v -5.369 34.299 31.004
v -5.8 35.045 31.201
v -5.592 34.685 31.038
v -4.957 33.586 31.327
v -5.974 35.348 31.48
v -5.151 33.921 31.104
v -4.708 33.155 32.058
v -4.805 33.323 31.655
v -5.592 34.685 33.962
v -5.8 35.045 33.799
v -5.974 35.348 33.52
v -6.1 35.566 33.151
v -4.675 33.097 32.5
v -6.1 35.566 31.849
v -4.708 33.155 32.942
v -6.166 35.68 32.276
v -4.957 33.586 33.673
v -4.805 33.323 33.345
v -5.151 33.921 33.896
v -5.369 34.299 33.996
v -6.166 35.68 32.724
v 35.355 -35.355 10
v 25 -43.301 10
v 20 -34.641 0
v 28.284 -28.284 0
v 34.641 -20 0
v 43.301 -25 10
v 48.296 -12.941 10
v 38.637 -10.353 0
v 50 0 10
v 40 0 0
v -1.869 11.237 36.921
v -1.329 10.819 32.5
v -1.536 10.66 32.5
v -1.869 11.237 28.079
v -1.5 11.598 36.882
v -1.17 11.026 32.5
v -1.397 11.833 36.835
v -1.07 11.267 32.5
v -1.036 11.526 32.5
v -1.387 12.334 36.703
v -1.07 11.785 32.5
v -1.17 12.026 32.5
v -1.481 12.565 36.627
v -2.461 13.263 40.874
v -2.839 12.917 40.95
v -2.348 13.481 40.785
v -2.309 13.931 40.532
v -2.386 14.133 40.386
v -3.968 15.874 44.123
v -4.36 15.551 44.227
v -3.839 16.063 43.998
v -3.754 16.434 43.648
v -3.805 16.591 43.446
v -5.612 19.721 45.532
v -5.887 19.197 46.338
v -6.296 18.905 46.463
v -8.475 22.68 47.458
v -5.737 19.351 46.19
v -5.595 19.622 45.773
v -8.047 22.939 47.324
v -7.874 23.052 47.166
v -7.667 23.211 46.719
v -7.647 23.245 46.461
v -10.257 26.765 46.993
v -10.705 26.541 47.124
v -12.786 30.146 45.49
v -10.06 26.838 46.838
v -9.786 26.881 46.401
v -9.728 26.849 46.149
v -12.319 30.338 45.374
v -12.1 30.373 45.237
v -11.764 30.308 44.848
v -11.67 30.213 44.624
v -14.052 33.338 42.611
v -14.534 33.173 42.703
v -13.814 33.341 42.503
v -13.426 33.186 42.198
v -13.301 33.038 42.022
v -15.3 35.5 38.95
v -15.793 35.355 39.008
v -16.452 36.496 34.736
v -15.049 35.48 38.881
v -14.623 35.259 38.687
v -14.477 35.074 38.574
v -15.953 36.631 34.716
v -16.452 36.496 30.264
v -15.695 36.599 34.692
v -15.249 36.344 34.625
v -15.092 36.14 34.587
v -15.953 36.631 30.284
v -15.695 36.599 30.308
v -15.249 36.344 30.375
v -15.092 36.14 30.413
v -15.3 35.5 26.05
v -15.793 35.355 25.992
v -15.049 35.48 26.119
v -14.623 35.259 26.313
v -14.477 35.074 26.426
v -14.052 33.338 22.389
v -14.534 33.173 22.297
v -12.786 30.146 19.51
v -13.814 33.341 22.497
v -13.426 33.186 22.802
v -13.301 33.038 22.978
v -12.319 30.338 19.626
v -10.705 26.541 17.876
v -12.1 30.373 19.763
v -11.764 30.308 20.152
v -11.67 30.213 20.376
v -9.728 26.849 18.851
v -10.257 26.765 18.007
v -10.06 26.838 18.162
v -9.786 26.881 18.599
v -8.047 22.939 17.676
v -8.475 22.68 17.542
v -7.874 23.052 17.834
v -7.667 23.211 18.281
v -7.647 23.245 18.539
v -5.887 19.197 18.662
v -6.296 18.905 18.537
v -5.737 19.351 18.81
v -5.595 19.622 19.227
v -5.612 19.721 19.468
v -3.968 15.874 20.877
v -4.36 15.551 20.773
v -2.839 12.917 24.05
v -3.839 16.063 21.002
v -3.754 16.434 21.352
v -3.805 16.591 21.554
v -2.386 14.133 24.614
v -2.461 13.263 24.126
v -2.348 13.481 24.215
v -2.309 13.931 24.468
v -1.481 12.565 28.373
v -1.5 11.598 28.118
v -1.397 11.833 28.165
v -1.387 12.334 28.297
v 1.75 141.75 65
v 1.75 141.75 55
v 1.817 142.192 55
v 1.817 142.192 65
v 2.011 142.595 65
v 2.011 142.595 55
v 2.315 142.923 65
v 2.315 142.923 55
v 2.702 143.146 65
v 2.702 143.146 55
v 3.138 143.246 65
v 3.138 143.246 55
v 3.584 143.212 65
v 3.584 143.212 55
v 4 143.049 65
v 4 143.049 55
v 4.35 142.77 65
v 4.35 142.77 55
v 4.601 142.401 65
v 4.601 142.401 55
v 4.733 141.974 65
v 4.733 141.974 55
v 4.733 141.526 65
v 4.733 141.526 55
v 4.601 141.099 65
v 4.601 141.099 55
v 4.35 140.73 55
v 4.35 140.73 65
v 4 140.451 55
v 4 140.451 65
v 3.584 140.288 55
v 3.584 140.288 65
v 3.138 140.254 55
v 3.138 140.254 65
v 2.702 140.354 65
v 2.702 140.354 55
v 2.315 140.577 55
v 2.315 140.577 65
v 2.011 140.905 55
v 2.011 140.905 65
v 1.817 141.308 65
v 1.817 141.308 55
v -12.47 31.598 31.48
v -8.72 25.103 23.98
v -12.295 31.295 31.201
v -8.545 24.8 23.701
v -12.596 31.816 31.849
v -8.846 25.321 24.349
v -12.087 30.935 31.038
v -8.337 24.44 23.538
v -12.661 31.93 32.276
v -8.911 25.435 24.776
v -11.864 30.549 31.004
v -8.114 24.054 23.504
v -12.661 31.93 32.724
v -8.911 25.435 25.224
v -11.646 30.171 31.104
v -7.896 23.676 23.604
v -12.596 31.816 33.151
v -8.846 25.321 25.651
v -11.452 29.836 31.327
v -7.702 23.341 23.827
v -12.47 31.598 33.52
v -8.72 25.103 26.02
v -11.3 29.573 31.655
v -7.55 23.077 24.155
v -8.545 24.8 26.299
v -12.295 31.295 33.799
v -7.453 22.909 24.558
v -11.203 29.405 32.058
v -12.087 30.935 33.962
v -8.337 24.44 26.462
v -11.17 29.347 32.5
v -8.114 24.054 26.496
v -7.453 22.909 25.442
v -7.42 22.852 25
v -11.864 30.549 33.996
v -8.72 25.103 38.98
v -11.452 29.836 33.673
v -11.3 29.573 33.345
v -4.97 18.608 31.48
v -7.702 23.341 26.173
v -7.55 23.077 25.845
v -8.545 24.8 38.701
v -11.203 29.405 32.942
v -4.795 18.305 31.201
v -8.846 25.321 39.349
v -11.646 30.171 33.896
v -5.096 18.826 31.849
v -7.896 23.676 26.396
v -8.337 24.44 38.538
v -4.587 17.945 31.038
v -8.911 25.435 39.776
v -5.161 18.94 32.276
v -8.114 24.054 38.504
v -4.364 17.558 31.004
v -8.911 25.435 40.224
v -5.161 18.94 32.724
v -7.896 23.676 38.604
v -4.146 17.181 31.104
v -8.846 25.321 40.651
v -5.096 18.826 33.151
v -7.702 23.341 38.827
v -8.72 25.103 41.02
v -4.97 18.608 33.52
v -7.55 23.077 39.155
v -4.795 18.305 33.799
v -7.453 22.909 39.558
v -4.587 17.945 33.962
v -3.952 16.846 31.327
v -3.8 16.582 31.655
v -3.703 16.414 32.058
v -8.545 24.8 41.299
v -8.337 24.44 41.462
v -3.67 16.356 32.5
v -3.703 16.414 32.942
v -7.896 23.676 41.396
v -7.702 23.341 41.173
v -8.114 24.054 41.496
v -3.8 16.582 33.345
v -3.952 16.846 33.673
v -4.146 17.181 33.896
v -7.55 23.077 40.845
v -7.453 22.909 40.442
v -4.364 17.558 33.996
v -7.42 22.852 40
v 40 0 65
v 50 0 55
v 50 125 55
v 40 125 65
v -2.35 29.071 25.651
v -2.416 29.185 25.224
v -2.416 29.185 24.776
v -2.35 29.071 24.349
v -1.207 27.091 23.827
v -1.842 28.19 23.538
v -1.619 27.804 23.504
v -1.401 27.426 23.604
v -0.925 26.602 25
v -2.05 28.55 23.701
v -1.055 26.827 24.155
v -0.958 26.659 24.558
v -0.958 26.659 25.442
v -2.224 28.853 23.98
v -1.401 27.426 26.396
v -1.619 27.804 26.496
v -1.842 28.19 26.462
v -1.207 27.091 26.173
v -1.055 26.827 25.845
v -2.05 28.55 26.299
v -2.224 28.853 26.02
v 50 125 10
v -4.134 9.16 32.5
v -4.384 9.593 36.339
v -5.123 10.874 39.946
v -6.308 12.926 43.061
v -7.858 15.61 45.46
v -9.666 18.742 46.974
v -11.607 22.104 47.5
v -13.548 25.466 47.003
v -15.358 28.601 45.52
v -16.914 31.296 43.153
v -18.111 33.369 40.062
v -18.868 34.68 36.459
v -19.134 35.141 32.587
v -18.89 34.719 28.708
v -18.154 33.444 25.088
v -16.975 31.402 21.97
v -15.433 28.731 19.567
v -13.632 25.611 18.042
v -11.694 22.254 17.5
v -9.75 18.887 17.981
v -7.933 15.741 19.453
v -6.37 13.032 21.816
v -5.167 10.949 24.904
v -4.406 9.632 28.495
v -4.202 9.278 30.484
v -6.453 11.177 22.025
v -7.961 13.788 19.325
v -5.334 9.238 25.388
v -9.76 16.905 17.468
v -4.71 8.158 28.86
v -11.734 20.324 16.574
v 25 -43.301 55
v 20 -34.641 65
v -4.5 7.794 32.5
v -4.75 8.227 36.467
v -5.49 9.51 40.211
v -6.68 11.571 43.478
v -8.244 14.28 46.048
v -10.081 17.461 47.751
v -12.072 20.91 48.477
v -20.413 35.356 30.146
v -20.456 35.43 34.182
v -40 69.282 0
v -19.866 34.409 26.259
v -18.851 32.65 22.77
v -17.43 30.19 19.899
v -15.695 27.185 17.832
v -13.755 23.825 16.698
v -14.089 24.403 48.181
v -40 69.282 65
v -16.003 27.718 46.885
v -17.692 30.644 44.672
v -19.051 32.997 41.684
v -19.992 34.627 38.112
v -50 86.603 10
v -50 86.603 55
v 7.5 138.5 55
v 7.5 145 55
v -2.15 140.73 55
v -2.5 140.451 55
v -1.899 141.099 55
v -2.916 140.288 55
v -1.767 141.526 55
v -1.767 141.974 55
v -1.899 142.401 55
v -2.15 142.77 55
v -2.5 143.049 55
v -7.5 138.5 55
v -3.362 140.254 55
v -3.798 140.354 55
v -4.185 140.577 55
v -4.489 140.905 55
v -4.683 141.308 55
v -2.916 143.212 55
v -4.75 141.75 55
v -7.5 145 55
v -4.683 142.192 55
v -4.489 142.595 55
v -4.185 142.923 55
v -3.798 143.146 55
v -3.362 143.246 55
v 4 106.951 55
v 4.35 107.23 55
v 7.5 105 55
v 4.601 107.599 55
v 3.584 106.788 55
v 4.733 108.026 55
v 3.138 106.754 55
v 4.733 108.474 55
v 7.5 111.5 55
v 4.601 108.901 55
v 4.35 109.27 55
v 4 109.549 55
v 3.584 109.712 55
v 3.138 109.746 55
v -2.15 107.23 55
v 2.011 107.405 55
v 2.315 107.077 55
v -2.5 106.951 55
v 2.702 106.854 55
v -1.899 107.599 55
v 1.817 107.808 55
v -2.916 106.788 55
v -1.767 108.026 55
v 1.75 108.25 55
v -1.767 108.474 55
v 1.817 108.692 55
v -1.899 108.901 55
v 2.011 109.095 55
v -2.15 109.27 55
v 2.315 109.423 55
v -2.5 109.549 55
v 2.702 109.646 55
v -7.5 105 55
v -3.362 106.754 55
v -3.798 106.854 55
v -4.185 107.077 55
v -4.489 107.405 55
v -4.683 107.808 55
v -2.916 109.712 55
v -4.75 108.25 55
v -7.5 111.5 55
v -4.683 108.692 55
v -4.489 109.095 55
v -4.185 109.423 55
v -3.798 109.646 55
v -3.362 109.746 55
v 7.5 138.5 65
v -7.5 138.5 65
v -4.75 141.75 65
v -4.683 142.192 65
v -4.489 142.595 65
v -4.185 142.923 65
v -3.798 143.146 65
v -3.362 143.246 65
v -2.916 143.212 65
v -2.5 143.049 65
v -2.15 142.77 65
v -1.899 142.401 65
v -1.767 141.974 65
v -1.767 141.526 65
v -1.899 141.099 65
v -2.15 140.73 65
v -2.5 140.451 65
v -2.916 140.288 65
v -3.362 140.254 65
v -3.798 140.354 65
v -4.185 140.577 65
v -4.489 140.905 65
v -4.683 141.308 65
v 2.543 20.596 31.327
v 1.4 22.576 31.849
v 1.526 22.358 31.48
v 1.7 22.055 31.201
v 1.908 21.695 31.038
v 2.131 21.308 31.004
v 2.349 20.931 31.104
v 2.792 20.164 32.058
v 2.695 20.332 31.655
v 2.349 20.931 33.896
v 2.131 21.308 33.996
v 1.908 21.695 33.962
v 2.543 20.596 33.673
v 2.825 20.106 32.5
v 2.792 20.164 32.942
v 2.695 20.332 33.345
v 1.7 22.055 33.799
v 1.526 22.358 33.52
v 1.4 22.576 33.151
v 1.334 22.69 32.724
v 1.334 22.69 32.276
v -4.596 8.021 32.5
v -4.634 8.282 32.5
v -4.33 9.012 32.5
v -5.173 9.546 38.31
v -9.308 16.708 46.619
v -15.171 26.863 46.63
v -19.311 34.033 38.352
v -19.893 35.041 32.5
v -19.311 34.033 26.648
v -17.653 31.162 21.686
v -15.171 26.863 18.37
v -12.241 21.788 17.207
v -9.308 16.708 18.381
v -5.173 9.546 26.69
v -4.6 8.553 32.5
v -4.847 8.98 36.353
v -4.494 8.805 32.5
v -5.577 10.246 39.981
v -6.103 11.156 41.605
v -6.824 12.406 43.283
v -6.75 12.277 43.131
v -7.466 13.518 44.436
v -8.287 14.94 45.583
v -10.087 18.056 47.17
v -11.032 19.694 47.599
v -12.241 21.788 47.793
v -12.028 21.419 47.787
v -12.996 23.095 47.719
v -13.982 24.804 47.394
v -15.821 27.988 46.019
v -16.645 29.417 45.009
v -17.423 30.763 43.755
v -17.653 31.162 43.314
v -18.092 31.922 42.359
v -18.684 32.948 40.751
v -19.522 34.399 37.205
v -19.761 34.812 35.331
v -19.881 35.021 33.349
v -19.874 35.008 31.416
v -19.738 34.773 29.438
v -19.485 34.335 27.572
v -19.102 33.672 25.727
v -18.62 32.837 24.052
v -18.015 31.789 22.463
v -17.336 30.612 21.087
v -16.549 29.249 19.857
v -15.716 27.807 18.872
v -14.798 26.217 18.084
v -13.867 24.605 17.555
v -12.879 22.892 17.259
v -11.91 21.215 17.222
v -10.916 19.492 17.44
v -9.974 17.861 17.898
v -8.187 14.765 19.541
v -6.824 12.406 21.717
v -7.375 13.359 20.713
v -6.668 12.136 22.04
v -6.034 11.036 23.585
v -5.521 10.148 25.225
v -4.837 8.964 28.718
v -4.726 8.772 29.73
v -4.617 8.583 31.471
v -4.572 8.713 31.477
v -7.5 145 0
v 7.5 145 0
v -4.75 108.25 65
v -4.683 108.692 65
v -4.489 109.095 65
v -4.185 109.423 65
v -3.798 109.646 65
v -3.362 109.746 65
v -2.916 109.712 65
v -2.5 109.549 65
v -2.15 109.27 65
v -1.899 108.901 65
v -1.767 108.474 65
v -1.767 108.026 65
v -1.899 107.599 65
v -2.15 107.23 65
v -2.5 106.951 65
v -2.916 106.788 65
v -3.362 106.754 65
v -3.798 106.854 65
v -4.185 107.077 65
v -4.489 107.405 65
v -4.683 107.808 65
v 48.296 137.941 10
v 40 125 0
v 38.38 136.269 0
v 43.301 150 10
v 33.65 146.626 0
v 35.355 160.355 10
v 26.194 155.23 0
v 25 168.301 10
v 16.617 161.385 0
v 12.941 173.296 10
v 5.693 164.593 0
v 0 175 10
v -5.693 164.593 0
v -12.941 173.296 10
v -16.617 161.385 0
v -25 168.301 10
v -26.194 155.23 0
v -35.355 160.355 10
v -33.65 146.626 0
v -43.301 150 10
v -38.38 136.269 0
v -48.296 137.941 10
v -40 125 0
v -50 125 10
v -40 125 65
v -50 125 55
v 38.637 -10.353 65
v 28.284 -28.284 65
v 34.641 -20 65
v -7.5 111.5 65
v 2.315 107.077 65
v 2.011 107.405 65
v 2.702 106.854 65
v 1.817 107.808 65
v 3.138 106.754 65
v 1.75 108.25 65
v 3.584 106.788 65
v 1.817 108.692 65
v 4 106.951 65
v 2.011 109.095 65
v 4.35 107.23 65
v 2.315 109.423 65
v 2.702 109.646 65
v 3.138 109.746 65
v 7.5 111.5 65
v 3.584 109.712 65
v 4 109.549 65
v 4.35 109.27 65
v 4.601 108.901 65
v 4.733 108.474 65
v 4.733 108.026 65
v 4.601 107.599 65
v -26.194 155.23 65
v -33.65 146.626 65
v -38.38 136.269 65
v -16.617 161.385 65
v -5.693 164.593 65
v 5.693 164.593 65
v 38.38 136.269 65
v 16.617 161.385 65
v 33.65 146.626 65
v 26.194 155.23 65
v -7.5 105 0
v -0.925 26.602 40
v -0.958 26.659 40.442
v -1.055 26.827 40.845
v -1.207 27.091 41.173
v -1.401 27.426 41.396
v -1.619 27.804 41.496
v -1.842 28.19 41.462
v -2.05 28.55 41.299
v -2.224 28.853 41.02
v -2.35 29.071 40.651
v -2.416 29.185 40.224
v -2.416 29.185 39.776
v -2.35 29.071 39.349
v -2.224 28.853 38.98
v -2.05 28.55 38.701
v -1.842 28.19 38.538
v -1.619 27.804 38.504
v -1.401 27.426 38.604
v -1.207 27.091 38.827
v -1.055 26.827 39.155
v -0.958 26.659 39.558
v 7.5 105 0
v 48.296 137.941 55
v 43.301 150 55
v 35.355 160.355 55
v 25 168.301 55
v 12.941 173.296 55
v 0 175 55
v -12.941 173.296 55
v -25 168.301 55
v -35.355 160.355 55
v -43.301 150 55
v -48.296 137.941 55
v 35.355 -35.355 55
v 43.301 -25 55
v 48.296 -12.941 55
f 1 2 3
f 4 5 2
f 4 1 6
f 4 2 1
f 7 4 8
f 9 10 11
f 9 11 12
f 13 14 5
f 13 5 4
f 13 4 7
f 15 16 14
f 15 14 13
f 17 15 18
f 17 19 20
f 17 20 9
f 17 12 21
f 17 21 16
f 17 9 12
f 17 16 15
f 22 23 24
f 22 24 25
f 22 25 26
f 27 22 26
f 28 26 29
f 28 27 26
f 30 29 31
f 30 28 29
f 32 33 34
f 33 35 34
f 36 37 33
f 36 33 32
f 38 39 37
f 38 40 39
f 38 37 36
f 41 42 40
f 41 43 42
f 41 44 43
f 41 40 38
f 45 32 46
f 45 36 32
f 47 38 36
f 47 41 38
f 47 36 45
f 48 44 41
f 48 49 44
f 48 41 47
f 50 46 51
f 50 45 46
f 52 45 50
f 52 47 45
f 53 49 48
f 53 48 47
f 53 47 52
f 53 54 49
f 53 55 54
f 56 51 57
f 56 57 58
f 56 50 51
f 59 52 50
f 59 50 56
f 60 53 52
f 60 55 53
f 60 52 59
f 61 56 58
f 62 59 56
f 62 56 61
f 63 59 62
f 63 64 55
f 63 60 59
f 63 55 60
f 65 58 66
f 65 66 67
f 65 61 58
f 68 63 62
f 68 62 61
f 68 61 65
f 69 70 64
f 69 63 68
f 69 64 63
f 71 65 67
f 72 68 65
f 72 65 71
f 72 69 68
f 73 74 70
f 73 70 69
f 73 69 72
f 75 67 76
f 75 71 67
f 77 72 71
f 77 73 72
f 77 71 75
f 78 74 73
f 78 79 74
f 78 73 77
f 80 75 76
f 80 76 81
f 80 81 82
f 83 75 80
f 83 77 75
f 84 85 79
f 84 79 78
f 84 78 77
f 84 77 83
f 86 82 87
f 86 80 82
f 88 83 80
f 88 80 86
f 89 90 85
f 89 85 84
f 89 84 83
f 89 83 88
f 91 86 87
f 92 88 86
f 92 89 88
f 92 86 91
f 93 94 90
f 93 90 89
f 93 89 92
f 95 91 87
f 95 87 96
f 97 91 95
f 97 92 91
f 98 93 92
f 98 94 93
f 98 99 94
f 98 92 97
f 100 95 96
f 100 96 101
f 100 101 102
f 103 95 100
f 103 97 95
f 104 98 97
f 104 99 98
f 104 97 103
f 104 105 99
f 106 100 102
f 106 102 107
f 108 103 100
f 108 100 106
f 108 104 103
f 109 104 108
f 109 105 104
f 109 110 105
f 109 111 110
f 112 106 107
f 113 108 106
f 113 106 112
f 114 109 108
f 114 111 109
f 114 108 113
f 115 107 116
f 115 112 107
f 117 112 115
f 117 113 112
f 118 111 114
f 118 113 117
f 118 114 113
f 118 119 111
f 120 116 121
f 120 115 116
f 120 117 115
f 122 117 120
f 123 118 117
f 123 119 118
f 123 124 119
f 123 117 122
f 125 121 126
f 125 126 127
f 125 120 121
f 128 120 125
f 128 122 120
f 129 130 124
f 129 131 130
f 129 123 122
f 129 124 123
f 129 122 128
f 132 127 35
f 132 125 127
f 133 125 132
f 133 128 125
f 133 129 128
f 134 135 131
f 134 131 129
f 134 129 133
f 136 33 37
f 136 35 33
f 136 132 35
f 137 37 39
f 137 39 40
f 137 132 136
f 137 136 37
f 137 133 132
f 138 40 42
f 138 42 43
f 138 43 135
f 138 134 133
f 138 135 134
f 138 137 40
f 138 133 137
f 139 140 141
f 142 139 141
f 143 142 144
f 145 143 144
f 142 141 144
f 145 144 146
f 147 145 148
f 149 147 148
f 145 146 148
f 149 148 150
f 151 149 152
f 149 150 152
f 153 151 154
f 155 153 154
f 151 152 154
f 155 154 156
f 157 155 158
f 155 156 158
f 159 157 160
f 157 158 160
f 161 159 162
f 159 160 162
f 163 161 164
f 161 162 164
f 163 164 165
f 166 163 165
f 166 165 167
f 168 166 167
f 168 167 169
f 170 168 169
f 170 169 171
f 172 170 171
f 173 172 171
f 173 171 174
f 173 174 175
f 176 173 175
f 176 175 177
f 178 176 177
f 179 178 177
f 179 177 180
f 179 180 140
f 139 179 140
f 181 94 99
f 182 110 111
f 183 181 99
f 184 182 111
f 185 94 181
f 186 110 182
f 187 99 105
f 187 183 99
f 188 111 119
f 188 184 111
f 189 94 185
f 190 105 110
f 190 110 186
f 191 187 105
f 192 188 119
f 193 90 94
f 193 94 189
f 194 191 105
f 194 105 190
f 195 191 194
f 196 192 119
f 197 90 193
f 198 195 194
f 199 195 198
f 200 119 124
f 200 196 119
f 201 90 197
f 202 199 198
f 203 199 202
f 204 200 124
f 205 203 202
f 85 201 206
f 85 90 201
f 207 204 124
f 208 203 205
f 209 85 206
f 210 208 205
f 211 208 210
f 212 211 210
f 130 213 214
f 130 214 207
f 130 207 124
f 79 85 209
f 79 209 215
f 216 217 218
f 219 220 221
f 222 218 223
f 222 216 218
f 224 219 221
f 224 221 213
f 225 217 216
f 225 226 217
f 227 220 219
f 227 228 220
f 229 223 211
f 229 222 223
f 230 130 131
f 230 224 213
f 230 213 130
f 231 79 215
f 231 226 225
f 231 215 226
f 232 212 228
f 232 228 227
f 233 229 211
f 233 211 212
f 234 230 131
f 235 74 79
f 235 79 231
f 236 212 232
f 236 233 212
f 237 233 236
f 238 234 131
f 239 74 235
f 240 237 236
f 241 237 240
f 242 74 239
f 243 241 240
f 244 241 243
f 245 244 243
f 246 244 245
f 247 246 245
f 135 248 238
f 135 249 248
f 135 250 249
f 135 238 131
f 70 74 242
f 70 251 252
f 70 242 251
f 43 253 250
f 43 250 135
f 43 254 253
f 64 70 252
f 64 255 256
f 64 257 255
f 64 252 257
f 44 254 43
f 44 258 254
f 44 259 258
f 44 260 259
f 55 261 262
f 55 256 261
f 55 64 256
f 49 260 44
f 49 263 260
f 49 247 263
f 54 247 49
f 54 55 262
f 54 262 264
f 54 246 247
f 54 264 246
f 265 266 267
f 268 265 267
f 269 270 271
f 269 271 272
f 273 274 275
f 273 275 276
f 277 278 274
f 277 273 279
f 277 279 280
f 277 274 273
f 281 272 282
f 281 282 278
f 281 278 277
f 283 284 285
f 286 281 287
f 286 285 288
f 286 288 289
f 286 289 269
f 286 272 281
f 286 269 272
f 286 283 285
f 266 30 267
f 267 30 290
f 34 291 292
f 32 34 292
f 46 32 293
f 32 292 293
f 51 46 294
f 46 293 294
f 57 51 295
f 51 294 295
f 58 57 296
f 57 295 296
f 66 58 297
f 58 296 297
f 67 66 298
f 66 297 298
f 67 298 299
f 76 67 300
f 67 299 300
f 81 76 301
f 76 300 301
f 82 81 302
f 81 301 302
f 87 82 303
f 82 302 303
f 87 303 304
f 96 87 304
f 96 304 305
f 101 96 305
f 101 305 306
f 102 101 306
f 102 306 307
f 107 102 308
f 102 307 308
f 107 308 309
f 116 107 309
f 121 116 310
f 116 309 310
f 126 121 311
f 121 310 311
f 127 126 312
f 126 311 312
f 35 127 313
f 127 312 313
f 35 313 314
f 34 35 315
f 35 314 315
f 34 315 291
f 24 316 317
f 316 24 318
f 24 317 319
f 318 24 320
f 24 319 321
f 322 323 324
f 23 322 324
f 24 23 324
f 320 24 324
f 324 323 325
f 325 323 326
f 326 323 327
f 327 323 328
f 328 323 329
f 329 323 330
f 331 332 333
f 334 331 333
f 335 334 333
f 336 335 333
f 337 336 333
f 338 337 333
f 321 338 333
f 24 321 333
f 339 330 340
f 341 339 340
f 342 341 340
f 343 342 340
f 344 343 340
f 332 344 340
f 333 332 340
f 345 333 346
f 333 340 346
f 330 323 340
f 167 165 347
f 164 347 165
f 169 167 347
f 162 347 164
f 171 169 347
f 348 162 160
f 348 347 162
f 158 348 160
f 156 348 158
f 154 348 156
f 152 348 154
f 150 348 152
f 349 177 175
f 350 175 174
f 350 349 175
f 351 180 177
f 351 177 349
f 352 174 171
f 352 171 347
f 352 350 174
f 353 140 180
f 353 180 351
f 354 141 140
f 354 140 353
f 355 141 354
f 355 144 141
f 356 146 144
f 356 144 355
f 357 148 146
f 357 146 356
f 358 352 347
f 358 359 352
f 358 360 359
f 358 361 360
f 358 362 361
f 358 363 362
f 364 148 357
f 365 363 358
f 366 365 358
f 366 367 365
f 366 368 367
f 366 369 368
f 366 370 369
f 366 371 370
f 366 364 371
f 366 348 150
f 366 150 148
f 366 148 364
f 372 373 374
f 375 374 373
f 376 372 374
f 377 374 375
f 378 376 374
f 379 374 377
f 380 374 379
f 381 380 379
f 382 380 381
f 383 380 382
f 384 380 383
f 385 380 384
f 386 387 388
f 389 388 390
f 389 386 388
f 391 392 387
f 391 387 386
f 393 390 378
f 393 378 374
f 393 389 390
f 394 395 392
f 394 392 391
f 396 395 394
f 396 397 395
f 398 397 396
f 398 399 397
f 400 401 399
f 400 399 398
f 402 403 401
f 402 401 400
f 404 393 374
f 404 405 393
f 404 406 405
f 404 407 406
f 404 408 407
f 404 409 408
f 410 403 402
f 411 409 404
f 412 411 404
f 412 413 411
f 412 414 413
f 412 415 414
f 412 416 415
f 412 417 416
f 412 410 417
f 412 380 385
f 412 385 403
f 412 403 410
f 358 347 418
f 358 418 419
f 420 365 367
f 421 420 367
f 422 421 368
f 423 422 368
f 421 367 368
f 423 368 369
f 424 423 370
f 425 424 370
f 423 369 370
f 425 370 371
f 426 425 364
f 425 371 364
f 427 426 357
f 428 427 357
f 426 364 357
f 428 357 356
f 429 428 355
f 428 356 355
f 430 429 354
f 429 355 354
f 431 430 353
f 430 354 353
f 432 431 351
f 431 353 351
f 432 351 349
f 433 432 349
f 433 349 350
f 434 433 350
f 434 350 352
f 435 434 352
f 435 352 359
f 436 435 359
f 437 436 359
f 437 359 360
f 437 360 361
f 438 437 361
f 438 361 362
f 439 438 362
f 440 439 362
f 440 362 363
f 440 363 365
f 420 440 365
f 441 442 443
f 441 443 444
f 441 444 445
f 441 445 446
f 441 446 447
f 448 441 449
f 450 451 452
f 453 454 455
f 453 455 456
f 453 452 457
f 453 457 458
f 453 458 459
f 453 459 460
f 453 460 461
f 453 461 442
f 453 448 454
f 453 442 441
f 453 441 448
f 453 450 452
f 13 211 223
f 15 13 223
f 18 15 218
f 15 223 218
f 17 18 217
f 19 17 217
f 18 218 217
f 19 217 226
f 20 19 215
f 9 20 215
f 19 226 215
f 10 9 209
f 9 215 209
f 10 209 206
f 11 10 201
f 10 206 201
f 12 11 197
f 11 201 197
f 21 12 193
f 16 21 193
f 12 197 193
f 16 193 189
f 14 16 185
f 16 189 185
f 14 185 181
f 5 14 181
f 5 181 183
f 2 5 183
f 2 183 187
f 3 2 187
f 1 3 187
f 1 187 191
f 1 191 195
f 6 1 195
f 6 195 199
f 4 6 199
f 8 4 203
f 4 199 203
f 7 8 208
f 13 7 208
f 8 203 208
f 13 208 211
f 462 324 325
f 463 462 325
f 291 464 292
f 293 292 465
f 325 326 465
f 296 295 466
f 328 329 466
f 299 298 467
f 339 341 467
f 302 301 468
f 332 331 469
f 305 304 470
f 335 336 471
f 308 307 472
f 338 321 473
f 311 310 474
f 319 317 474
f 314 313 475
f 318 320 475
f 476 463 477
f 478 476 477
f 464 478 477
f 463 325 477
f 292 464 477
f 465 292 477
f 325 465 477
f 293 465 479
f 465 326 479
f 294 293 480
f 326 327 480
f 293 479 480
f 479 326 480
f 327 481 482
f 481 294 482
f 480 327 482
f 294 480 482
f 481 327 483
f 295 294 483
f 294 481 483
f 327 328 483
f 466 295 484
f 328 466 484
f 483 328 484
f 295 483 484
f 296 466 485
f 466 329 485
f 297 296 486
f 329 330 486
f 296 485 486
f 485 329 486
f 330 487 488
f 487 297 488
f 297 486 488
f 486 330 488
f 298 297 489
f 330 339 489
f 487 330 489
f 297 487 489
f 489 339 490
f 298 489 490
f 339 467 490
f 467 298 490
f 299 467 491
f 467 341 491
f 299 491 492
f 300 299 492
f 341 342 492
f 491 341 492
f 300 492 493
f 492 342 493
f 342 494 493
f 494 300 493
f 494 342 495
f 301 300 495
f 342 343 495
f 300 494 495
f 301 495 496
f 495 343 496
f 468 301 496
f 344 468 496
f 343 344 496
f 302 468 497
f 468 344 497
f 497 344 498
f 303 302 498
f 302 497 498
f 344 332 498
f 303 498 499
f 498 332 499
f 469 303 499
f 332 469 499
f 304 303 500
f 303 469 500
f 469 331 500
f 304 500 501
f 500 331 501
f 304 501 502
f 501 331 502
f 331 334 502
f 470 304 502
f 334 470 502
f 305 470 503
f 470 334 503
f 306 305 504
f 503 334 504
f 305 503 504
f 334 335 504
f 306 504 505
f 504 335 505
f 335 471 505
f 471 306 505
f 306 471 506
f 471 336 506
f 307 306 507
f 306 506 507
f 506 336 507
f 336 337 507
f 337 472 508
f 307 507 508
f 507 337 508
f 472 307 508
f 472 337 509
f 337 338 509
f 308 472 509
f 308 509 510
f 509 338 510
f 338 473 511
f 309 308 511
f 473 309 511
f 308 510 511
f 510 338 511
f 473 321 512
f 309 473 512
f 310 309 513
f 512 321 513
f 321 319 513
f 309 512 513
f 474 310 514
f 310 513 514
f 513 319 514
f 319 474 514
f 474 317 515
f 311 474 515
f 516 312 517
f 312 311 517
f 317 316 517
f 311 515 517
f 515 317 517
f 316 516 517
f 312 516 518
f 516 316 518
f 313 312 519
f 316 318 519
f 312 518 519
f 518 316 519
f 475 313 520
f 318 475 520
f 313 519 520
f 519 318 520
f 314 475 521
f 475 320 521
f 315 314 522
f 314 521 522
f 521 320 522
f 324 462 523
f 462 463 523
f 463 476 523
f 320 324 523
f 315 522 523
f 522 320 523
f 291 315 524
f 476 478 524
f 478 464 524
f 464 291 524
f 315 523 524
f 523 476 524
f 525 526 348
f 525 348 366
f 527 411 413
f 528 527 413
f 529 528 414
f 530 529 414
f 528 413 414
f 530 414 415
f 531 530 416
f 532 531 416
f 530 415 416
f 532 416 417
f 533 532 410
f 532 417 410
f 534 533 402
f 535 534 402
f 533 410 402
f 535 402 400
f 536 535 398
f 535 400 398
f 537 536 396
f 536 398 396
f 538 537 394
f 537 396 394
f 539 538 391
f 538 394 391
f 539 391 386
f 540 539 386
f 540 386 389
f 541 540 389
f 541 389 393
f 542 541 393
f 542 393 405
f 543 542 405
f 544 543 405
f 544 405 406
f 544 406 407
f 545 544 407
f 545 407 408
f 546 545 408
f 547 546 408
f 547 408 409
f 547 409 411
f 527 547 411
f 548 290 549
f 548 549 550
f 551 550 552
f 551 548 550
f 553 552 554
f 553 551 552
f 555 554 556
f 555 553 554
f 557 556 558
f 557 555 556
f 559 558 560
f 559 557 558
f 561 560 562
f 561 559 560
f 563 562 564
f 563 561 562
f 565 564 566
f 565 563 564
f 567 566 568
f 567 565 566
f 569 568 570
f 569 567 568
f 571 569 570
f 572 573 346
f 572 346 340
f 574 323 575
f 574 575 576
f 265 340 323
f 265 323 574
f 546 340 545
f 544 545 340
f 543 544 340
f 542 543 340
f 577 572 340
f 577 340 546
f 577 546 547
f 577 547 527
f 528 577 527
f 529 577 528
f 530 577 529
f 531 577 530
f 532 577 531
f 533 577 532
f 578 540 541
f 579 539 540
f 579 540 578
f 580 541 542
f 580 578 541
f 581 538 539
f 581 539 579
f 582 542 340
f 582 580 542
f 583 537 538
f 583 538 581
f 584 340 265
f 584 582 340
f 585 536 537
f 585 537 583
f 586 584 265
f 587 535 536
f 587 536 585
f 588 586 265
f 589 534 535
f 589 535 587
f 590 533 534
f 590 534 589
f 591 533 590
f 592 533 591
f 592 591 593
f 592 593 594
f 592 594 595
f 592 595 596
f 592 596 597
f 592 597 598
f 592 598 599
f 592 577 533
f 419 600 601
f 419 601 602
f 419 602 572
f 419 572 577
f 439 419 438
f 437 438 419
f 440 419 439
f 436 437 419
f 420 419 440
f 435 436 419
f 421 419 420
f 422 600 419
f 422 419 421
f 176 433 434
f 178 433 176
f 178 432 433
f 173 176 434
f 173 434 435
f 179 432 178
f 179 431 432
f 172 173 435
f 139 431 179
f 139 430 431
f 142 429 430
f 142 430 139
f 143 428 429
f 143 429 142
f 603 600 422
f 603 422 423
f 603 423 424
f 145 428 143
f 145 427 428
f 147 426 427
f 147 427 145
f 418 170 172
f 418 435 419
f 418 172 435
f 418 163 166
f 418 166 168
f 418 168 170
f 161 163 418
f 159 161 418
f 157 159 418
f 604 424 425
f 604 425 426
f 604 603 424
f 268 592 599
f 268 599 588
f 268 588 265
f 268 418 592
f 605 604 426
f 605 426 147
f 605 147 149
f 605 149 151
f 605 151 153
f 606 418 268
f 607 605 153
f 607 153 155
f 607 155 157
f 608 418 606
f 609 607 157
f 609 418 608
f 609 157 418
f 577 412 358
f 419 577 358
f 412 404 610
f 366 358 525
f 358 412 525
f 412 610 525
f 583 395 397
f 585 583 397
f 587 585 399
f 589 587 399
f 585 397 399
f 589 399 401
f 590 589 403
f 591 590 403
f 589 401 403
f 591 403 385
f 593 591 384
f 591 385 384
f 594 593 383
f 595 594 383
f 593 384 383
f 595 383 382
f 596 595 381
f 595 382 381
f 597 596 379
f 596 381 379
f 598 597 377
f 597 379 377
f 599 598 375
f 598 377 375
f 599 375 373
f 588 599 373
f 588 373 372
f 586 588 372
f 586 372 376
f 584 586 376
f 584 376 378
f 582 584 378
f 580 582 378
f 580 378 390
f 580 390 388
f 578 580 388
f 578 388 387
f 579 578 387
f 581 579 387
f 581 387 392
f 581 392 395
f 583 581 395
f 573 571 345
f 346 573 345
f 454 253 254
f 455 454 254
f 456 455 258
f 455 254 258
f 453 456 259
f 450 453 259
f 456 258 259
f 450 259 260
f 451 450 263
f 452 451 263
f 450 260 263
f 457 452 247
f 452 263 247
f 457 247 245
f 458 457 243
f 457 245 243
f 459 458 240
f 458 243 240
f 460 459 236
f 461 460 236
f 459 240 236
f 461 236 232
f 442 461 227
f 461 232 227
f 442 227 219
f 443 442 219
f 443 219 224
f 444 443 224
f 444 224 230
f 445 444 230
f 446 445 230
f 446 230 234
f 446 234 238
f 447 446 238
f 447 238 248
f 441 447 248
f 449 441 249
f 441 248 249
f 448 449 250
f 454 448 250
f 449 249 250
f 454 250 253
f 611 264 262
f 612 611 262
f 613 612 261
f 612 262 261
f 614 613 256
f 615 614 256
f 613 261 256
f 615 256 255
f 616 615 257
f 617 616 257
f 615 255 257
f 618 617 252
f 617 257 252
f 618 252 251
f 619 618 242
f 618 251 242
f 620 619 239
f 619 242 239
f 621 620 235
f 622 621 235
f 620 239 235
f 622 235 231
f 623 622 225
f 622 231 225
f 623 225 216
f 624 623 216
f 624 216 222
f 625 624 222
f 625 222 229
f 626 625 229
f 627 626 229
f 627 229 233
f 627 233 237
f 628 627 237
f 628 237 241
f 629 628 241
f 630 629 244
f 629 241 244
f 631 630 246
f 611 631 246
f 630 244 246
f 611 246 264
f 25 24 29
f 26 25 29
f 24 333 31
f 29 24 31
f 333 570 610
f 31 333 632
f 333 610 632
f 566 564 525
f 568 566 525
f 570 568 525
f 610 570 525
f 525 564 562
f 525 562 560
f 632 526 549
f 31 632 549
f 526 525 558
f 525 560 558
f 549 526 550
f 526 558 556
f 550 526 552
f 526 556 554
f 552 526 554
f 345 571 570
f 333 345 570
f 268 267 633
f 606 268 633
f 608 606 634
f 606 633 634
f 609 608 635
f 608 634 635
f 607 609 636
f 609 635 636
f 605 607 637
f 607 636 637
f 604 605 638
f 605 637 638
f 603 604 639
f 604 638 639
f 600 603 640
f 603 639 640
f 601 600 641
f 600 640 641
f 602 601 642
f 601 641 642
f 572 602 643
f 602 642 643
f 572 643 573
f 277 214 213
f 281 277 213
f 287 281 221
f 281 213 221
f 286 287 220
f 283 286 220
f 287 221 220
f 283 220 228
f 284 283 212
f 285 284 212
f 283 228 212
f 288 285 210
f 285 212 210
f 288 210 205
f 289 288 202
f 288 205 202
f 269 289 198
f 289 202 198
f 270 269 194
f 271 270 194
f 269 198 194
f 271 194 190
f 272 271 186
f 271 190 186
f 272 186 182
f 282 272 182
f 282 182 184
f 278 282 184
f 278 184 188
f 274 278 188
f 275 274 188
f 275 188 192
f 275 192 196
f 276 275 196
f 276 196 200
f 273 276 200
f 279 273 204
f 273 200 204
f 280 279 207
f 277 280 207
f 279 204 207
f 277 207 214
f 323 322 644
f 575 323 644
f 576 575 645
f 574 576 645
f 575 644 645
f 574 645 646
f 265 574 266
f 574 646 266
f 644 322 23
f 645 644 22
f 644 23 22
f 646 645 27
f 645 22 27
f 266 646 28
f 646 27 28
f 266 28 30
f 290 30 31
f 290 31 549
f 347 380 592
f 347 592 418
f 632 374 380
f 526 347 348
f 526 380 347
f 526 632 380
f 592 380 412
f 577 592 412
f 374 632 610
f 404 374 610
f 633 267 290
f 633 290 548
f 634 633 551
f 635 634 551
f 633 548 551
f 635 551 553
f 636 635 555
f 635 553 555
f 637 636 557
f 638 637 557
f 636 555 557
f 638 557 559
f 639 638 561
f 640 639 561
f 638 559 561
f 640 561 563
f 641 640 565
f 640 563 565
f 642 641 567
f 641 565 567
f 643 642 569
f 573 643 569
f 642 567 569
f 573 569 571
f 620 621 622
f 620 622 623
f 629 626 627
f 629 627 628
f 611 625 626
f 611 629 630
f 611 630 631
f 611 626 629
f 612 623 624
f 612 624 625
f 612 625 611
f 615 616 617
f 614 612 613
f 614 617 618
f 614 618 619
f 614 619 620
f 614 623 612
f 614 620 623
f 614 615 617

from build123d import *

# Parameters (mm, degrees)
BOSS_EXTRUDE1_DEPTH = 65
CUT_EXTRUDE1_DEPTH  = 194.261480901
SKETCH5_R           = 15
CUT_EXTRUDE4_DEPTH  = 5
SKETCH6_R           = 1.5
CUT_EXTRUDE5_DEPTH  = 7.5
CHAMFER1_SIZE       = 10
SKETCH8_W           = 15
SKETCH8_H           = 40
CUT_EXTRUDE6_DEPTH  = 55
SKETCH9_W           = 15
SKETCH9_H           = 27
SKETCH9_R           = 1.5
CUT_EXTRUDE7_DEPTH  = 191.131533418
FILLET1_R           = 1


with BuildPart() as part:
    # Sketch1 → Boss-Extrude1 (new body)
    with BuildSketch(Plane.XY):
        with BuildLine():
            Line((-50, 125), (-50, 0))
            ThreePointArc((-50, 0), (0, -50), (50, 0))
            Line((50, 0), (50, 125))
            ThreePointArc((50, 125), (0, 175), (-50, 125))
        make_face()
    extrude(amount=BOSS_EXTRUDE1_DEPTH)

    # Sketch2 → Cut-Extrude1 (cut, through all)
    with BuildSketch(Plane.XY.offset(65)):
        Polygon((260.825571734, -451.763142156), (25, -43.301270189), (-50, 86.602540378), (-50, 0), (-50, -471.651143468), (10.233499812, -1413.028395178), (321.059071546, -1393.140393866), align=None)
    extrude(amount=-CUT_EXTRUDE1_DEPTH, mode=Mode.SUBTRACT)

    # Sketch5 → Cut-Extrude4 (cut)
    with BuildSketch(Plane(origin=(0, 0, 0), x_dir=(0, 0, 1), z_dir=(-0.866025403784438, -0.5000000000000012, 0))):
        with Locations(Location((32.5, 25, 0), (0, 0, 270))):
            Circle(SKETCH5_R)
    extrude(amount=-CUT_EXTRUDE4_DEPTH, mode=Mode.SUBTRACT)

    # Sketch6 → Cut-Extrude5 (cut)
    with BuildSketch(Plane(origin=(4.330127019, 2.5, 0), x_dir=(0, 0, 1), z_dir=(-0.8660254037844378, -0.5000000000000012, 0))):
        with Locations(Location((40, 25, 0), (0, 0, 270))):
            Circle(SKETCH6_R)
        with Locations(Location((32.5, 32.5, 0), (0, 0, 270))):
            Circle(SKETCH6_R)
        with Locations(Location((32.5, 17.5, 0), (0, 0, 270))):
            Circle(SKETCH6_R)
        with Locations(Location((25, 25, 0), (0, 0, 270))):
            Circle(SKETCH6_R)
    extrude(amount=-CUT_EXTRUDE5_DEPTH, mode=Mode.SUBTRACT)

    # Chamfer1
    chamfer1_edges = [part.edges().sort_by_distance(p)[0] for p in [
        (43.301270189, -25, 0),
        (43.301270189, -25, 65),
        (50, 62.5, 65),
        (0, 175, 65),
        (50, 62.5, 0),
        (-50, 105.801270189, 0),
        (0, 175, 0),
        (-50, 105.801270189, 65),
    ]]
    chamfer(chamfer1_edges, length=CHAMFER1_SIZE)

    # Sketch8 → Cut-Extrude6 (cut)
    with BuildSketch(Plane(origin=(0, 0, 0), x_dir=(-1, 0, 0), z_dir=(0, 0, -1))):
        with Locations((0, 125)):
            Rectangle(SKETCH8_W, SKETCH8_H)
    extrude(amount=-CUT_EXTRUDE6_DEPTH, mode=Mode.SUBTRACT)

    # Sketch9 → Cut-Extrude7 (cut, through all)
    with BuildSketch(Plane(origin=(0, 0, 55), x_dir=(-1, 0, 0), z_dir=(0, 0, -1))):
        with Locations((0, 125)):
            Rectangle(SKETCH9_W, SKETCH9_H)
        with Locations((-3.25, 108.25)):
            Circle(SKETCH9_R)
        with Locations((3.25, 108.25)):
            Circle(SKETCH9_R)
        with Locations((-3.25, 141.75)):
            Circle(SKETCH9_R)
        with Locations((3.25, 141.75)):
            Circle(SKETCH9_R)
    extrude(amount=-CUT_EXTRUDE7_DEPTH, mode=Mode.SUBTRACT)

    # Fillet1
    fillet1_edges = [part.edges().sort_by_distance(p)[0] for p in [
        (-15.669872981, 37.141016151, 32.5),
        (-20, 34.641016151, 32.5),
    ]]
    fillet(fillet1_edges, radius=FILLET1_R)


solid = part.part
